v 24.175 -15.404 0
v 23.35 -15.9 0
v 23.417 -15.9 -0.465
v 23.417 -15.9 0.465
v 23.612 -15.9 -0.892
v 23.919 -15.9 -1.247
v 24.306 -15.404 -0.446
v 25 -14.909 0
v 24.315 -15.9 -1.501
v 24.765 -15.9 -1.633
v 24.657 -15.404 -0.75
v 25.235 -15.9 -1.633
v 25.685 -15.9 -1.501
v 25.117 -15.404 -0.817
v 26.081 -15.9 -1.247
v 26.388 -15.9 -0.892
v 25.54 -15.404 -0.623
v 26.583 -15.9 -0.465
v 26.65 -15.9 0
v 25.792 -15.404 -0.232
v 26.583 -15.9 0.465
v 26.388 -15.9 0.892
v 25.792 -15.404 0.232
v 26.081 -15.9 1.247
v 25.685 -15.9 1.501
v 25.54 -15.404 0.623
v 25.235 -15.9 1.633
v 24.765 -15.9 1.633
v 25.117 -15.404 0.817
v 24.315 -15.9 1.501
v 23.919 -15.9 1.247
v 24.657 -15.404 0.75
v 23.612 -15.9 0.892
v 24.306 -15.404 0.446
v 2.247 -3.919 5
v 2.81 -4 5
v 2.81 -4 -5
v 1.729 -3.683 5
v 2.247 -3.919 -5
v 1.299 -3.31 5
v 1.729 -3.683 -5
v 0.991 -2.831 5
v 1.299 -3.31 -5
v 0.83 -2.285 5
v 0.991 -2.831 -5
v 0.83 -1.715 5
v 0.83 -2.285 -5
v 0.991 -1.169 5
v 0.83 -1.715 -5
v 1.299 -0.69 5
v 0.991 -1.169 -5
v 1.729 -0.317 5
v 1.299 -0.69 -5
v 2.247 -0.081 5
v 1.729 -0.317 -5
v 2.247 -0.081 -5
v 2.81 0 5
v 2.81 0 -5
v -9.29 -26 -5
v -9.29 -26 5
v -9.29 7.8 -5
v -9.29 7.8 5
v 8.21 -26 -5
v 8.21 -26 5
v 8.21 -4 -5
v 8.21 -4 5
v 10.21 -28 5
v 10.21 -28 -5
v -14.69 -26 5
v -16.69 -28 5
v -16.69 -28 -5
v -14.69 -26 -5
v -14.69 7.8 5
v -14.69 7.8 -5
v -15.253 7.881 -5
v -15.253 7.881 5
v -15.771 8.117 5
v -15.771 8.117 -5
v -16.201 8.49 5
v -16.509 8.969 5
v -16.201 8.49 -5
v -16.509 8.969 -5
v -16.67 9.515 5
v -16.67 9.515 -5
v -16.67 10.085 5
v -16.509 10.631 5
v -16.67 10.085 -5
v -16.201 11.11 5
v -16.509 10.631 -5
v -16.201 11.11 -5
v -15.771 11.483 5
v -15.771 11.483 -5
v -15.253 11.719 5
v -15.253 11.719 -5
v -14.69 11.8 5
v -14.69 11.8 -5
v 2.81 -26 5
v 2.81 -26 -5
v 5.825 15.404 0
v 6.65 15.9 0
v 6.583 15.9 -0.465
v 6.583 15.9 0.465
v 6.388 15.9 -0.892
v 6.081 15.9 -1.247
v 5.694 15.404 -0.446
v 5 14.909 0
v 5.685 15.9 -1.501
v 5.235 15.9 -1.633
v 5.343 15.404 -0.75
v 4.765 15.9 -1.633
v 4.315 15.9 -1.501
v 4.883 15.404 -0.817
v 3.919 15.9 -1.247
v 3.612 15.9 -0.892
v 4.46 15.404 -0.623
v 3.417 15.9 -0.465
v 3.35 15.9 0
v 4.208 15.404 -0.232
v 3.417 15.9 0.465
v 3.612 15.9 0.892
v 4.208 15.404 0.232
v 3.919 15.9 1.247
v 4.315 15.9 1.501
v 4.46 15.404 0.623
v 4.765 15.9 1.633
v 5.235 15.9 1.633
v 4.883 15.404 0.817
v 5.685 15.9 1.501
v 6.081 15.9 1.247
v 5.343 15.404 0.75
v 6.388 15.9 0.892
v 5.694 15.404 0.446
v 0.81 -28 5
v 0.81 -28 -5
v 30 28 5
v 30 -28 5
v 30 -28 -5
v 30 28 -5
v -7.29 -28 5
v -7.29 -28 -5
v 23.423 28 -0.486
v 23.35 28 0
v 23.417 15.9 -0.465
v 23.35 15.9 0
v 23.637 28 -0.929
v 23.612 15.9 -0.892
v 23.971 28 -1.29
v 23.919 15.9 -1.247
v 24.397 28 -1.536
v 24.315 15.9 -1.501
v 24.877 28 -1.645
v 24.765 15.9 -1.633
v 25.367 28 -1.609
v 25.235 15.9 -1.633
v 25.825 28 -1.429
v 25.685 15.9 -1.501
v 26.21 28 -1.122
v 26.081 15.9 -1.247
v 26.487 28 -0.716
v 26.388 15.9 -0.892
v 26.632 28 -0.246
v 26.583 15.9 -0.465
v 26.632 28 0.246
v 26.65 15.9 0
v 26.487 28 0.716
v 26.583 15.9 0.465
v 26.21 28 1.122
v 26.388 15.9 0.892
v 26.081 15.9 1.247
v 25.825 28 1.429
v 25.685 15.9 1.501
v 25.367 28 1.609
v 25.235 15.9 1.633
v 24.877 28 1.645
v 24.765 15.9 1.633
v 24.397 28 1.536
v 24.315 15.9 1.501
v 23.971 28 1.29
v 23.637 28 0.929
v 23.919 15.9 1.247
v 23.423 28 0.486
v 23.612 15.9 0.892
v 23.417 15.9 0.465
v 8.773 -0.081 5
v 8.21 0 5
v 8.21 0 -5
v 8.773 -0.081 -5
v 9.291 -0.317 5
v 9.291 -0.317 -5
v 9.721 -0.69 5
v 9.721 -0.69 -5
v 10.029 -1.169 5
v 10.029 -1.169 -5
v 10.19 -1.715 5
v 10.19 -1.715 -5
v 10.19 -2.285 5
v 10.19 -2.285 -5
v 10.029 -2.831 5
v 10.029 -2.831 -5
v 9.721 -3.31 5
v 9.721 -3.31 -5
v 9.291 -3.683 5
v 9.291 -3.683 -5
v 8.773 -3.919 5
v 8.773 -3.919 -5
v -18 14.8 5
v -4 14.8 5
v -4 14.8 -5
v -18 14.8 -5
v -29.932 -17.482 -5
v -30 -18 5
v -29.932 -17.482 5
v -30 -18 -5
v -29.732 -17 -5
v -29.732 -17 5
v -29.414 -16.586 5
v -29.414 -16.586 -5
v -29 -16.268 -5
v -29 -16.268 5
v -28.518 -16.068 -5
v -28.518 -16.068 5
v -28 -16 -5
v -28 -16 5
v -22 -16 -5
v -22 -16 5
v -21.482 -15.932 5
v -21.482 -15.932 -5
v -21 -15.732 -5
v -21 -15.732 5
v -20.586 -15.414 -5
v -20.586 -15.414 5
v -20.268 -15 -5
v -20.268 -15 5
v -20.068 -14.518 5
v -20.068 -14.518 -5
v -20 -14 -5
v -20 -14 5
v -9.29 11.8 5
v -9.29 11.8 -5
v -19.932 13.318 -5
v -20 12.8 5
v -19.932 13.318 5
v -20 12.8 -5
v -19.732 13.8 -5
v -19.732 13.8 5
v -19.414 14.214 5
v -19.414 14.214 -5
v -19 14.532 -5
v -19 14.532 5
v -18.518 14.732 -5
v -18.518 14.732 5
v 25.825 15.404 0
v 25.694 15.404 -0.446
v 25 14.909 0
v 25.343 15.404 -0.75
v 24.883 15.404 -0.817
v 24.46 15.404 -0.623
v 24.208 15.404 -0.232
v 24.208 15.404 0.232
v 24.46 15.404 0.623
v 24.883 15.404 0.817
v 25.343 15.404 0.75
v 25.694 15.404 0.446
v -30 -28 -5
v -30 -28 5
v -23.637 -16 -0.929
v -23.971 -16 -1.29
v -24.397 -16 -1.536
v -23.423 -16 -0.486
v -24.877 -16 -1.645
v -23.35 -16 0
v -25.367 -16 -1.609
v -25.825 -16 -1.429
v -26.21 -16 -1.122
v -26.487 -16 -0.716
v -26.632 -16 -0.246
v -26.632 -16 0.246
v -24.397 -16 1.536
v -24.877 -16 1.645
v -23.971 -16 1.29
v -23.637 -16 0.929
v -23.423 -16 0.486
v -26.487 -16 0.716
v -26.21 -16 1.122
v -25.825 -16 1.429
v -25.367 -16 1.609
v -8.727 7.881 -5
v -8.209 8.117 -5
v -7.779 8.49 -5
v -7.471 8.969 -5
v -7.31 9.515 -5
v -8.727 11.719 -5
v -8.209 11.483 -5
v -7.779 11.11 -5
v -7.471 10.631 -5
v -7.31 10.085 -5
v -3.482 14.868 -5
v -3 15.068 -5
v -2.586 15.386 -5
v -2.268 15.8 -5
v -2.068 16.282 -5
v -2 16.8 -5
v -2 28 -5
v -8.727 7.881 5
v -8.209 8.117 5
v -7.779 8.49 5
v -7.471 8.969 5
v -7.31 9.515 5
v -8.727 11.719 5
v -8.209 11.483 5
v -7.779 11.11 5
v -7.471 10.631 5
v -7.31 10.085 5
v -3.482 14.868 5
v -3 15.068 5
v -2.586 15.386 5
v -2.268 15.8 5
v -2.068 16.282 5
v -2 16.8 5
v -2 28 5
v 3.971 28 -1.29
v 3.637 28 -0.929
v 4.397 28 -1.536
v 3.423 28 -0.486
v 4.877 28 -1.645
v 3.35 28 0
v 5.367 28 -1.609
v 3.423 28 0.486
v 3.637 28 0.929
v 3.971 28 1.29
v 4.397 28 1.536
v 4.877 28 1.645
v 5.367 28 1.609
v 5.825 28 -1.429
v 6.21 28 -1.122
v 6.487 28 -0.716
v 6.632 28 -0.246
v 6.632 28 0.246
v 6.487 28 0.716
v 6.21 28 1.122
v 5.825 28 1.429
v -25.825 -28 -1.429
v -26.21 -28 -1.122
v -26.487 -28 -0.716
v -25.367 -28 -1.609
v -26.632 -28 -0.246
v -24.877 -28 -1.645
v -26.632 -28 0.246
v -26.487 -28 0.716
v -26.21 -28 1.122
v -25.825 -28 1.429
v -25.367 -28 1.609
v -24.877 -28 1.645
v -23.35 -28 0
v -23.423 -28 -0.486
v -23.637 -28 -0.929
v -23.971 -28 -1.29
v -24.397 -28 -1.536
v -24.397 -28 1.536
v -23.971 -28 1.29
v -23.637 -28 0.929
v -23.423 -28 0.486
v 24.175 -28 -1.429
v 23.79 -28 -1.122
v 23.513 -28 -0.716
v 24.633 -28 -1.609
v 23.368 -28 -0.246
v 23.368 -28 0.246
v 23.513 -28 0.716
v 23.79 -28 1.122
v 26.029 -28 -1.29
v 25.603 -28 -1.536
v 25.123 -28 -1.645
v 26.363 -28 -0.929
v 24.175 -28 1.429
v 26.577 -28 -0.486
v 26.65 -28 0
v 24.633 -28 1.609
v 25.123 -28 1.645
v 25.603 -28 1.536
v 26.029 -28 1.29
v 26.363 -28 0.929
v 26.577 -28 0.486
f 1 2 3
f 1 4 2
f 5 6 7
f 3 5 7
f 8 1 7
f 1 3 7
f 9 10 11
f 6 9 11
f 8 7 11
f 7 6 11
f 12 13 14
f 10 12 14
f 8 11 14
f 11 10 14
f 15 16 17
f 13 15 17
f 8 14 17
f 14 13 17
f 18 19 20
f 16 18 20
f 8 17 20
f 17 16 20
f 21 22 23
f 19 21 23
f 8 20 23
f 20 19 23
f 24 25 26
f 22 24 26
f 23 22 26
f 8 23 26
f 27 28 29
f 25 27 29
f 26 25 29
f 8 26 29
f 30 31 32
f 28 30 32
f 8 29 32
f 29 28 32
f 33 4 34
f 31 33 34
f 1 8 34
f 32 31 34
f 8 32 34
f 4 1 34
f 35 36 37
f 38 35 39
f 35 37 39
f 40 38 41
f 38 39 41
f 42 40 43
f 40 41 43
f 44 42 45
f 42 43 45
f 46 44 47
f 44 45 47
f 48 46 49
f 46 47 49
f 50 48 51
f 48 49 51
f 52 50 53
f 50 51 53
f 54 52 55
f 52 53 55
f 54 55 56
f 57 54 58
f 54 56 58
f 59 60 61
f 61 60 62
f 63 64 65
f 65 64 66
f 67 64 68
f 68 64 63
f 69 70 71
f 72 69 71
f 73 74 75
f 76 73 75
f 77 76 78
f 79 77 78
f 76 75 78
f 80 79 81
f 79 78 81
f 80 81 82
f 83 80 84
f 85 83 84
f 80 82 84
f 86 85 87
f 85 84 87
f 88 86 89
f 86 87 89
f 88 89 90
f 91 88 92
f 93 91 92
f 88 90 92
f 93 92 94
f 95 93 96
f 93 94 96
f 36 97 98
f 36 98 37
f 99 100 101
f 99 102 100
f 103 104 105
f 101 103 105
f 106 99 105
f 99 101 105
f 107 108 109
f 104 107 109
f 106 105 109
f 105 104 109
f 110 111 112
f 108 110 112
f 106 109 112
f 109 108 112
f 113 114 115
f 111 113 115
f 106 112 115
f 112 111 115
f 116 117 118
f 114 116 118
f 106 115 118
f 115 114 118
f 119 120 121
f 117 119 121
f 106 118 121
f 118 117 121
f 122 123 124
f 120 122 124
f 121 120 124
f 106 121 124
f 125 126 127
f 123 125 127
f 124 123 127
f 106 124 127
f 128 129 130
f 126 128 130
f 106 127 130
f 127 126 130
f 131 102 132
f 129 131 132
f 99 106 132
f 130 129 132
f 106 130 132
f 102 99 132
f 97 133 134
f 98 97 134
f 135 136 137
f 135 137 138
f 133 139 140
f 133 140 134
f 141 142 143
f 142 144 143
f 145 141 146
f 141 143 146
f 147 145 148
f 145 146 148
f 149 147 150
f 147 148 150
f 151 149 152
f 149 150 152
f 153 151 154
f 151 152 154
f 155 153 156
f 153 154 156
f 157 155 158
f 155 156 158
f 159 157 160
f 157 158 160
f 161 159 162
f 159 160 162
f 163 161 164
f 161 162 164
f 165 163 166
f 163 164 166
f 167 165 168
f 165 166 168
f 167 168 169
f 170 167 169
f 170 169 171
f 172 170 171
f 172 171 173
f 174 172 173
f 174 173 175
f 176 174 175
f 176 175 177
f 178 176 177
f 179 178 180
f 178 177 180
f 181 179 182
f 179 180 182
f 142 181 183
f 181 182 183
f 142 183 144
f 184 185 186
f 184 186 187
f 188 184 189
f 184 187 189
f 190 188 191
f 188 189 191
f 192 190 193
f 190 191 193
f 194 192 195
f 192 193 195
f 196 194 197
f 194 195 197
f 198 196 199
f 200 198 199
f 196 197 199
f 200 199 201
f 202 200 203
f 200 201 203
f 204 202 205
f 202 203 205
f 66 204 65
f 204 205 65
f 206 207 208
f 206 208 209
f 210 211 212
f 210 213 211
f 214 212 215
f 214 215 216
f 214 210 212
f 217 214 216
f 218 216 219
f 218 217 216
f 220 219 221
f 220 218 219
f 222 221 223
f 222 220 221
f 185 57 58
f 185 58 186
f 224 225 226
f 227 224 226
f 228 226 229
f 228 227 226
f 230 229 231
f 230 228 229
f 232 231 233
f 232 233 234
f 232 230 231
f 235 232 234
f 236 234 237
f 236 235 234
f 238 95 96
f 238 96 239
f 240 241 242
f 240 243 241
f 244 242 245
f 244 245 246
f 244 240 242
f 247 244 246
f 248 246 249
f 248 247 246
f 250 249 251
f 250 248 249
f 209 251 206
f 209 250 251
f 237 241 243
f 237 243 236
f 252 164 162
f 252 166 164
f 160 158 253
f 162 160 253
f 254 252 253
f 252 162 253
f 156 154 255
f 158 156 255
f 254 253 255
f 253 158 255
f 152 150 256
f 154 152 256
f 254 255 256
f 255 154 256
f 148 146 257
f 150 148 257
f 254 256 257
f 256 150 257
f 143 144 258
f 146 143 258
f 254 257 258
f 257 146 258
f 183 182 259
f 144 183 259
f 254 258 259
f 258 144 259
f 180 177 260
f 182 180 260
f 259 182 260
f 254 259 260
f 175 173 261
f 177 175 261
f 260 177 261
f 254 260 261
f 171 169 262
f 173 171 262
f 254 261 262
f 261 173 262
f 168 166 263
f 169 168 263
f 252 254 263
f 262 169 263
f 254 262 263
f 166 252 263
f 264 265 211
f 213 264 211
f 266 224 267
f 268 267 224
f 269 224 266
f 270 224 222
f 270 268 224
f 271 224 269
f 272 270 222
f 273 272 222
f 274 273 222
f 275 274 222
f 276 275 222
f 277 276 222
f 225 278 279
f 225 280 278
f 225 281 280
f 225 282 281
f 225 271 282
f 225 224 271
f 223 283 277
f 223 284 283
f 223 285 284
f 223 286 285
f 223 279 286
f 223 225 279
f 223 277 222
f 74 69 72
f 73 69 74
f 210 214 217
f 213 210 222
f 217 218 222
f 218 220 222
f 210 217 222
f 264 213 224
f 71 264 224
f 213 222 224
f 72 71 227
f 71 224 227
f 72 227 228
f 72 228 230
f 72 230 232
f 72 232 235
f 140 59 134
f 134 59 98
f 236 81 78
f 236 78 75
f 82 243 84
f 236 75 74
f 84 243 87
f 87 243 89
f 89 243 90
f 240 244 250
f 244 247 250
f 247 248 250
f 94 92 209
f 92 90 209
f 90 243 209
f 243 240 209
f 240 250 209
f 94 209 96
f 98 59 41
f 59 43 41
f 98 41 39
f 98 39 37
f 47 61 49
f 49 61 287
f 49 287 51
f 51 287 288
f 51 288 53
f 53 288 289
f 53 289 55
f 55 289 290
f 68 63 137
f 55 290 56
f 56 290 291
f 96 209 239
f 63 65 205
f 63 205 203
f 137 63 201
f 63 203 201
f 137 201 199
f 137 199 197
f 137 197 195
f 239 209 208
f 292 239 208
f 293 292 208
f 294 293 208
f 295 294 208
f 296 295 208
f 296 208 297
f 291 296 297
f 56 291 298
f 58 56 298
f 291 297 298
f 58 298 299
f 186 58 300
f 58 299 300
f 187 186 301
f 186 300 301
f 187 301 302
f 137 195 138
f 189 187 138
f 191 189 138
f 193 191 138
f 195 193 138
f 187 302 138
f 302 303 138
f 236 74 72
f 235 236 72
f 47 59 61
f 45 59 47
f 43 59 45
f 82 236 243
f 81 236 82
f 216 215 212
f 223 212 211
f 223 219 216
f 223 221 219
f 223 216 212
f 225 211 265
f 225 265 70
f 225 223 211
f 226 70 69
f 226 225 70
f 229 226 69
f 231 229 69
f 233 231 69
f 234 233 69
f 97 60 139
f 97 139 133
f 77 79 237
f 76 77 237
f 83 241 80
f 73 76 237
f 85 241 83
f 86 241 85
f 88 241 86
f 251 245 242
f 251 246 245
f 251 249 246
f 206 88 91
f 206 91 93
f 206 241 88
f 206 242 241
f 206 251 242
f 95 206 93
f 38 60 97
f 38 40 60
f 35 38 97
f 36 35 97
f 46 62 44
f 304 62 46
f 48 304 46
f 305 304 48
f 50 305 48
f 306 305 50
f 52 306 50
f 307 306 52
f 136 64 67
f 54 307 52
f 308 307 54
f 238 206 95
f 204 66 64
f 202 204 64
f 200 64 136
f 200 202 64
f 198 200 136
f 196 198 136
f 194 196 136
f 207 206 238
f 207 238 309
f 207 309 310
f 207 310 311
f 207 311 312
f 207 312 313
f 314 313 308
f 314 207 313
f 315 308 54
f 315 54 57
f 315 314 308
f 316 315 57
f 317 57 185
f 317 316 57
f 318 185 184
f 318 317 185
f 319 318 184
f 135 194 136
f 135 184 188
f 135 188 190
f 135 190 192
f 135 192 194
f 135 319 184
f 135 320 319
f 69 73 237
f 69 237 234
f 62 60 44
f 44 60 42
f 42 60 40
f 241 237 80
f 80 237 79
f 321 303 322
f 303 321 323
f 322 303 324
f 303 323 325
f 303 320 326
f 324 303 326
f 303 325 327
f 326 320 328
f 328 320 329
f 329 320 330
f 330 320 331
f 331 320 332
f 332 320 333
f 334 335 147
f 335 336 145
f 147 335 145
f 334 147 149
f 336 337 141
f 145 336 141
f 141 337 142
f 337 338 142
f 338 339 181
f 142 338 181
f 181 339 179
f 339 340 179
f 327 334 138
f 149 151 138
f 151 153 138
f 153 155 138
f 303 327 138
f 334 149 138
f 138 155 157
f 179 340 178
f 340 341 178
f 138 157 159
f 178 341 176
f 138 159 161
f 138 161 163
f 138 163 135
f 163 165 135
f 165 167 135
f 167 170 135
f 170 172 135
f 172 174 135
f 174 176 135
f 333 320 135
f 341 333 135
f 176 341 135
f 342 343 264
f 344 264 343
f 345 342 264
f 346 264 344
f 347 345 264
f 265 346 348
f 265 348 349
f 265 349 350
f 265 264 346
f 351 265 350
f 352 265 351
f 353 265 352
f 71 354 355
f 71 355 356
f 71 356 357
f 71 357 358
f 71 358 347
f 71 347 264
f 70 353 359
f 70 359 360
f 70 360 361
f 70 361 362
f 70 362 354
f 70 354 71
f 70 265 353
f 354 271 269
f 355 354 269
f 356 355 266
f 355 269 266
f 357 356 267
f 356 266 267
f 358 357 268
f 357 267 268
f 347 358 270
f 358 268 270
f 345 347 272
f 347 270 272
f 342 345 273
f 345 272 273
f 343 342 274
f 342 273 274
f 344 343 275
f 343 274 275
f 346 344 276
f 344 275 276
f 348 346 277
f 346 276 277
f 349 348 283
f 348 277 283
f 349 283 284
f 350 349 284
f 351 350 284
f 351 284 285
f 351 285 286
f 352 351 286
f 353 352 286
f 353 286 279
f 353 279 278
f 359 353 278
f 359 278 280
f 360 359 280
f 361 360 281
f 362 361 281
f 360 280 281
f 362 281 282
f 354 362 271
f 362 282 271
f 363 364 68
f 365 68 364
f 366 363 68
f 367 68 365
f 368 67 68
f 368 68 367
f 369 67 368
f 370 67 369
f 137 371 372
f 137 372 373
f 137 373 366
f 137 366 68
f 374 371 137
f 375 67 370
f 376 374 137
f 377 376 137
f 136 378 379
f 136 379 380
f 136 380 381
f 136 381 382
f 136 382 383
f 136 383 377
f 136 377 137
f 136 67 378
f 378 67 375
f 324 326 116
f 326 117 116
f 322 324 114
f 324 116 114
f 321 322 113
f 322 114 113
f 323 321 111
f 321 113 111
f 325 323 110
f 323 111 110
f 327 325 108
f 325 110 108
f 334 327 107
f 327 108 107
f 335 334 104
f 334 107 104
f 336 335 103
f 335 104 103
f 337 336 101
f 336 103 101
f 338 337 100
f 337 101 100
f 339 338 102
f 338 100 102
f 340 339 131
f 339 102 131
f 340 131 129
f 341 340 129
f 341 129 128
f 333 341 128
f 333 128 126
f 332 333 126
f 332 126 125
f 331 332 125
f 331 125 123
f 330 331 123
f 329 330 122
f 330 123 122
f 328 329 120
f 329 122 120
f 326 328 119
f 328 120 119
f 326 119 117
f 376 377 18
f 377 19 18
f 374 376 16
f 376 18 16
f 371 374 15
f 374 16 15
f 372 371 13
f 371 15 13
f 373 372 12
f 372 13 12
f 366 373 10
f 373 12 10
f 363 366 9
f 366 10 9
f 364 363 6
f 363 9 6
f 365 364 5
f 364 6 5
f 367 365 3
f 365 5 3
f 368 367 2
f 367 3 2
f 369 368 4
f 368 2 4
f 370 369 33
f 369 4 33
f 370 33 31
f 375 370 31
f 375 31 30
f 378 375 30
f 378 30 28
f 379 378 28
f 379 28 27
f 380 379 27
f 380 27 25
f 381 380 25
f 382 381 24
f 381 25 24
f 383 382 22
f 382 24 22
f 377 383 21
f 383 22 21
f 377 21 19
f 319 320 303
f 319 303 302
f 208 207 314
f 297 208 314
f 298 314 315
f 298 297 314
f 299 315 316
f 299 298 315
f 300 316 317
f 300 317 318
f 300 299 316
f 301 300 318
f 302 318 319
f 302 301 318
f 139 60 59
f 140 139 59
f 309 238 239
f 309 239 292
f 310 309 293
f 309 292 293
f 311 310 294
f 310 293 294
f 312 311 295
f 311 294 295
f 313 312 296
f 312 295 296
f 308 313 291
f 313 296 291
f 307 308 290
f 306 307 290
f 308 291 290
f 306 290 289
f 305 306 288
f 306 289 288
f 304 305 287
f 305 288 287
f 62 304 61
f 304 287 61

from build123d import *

# Parameters (mm, degrees)
SKETCH_1_W             = 60
SKETCH_1_H             = 56
EXTRUDE_1_DEPTH        = 5
SKETCH_3_W             = 5.4
SKETCH_3_H             = 28
SKETCH_3_H_2           = 39.8
CUT_EXTRUDE_1_DEPTH    = 43.237424164
HOLE_WIZARD_M4_1_D     = 3.3
HOLE_WIZARD_M4_1_DEPTH = 12.1
HOLE_WIZARD_M4_1_TIP   = 0.991420021
MM_1_D                 = 4
MM_1_DEPTH             = 13
MM_1_TIP               = 1.201721238
CHAMFER_1_SIZE         = 2
CUT_EXTRUDE_4_DEPTH    = 43.237424164
FILLET_2_R             = 2
HOLE_WIZARD_M4_2_D     = 3.3
HOLE_WIZARD_M4_2_DEPTH = 12.1
HOLE_WIZARD_M4_2_TIP   = 0.991420021


with BuildPart() as part:
    # 草图1 → 凸台-拉伸1 (new, symmetric)
    with BuildSketch(Plane.XY):
        Rectangle(SKETCH_1_W, SKETCH_1_H)
    extrude(amount=EXTRUDE_1_DEPTH, both=True)

    # 草图3 → 切除-拉伸1 (cut, through all)
    with BuildSketch(Plane.XY.offset(5)):
        with Locations((5.51, -14)):
            Rectangle(SKETCH_3_W, SKETCH_3_H)
        with Locations((-11.99, -8.1)):
            Rectangle(SKETCH_3_W, SKETCH_3_H_2)
    extrude(amount=-CUT_EXTRUDE_1_DEPTH, mode=Mode.SUBTRACT)

    # M4 螺纹孔1
    with Locations(Plane(origin=(0, -28, 0), x_dir=(-1, 0, 0), z_dir=(0, -1, 0))):
        with Locations((25, 0), (-25, 0)):
            Hole(HOLE_WIZARD_M4_1_D / 2, depth=HOLE_WIZARD_M4_1_DEPTH)
            with Locations((0, 0, -(HOLE_WIZARD_M4_1_DEPTH + HOLE_WIZARD_M4_1_TIP / 2))):  # 118° drill point
                Cone(0, HOLE_WIZARD_M4_1_D / 2, HOLE_WIZARD_M4_1_TIP, mode=Mode.SUBTRACT)

    # 大小mm 暗销孔1
    with Locations(Plane.XY.offset(5)):
        with Locations((-14.69, 9.8), (-9.29, 9.8), (2.81, -2), (8.21, -2)):
            Hole(MM_1_D / 2, depth=MM_1_DEPTH)
            with Locations((0, 0, -(MM_1_DEPTH + MM_1_TIP / 2))):  # 118° drill point
                Cone(0, MM_1_D / 2, MM_1_TIP, mode=Mode.SUBTRACT)

    # 倒角1
    chamfer_1_edges = [part.edges().sort_by_distance(p)[0] for p in [
        (2.81, -28, 0),
        (8.21, -28, 0),
        (-9.29, -28, 0),
        (-14.69, -28, 0),
    ]]
    chamfer(chamfer_1_edges, length=CHAMFER_1_SIZE)

    # 草图13 → 切除-拉伸4 (cut, through all)
    with BuildSketch(Plane.XY.offset(5)):
        Polygon((-30, 28), (-2, 28), (-2, 14.8), (-20, 14.8), (-20, -16), (-30, -16), align=None)
    extrude(amount=-CUT_EXTRUDE_4_DEPTH, mode=Mode.SUBTRACT)

    # 圆角2
    fillet_2_edges = [part.edges().sort_by_distance(p)[0] for p in [
        (-20, -16, 0),
        (-30, -16, 0),
        (-2, 14.8, 0),
        (-20, 14.8, 0),
    ]]
    fillet(fillet_2_edges, radius=FILLET_2_R)

    # M4 螺纹孔2
    with Locations(Plane(origin=(0, 28, 0), x_dir=(1, 0, 0), z_dir=(0, 1, 0))):
        with Locations((25, 0), (5, 0)):
            Hole(HOLE_WIZARD_M4_2_D / 2, depth=HOLE_WIZARD_M4_2_DEPTH)
            with Locations((0, 0, -(HOLE_WIZARD_M4_2_DEPTH + HOLE_WIZARD_M4_2_TIP / 2))):  # 118° drill point
                Cone(0, HOLE_WIZARD_M4_2_D / 2, HOLE_WIZARD_M4_2_TIP, mode=Mode.SUBTRACT)


solid = part.part
